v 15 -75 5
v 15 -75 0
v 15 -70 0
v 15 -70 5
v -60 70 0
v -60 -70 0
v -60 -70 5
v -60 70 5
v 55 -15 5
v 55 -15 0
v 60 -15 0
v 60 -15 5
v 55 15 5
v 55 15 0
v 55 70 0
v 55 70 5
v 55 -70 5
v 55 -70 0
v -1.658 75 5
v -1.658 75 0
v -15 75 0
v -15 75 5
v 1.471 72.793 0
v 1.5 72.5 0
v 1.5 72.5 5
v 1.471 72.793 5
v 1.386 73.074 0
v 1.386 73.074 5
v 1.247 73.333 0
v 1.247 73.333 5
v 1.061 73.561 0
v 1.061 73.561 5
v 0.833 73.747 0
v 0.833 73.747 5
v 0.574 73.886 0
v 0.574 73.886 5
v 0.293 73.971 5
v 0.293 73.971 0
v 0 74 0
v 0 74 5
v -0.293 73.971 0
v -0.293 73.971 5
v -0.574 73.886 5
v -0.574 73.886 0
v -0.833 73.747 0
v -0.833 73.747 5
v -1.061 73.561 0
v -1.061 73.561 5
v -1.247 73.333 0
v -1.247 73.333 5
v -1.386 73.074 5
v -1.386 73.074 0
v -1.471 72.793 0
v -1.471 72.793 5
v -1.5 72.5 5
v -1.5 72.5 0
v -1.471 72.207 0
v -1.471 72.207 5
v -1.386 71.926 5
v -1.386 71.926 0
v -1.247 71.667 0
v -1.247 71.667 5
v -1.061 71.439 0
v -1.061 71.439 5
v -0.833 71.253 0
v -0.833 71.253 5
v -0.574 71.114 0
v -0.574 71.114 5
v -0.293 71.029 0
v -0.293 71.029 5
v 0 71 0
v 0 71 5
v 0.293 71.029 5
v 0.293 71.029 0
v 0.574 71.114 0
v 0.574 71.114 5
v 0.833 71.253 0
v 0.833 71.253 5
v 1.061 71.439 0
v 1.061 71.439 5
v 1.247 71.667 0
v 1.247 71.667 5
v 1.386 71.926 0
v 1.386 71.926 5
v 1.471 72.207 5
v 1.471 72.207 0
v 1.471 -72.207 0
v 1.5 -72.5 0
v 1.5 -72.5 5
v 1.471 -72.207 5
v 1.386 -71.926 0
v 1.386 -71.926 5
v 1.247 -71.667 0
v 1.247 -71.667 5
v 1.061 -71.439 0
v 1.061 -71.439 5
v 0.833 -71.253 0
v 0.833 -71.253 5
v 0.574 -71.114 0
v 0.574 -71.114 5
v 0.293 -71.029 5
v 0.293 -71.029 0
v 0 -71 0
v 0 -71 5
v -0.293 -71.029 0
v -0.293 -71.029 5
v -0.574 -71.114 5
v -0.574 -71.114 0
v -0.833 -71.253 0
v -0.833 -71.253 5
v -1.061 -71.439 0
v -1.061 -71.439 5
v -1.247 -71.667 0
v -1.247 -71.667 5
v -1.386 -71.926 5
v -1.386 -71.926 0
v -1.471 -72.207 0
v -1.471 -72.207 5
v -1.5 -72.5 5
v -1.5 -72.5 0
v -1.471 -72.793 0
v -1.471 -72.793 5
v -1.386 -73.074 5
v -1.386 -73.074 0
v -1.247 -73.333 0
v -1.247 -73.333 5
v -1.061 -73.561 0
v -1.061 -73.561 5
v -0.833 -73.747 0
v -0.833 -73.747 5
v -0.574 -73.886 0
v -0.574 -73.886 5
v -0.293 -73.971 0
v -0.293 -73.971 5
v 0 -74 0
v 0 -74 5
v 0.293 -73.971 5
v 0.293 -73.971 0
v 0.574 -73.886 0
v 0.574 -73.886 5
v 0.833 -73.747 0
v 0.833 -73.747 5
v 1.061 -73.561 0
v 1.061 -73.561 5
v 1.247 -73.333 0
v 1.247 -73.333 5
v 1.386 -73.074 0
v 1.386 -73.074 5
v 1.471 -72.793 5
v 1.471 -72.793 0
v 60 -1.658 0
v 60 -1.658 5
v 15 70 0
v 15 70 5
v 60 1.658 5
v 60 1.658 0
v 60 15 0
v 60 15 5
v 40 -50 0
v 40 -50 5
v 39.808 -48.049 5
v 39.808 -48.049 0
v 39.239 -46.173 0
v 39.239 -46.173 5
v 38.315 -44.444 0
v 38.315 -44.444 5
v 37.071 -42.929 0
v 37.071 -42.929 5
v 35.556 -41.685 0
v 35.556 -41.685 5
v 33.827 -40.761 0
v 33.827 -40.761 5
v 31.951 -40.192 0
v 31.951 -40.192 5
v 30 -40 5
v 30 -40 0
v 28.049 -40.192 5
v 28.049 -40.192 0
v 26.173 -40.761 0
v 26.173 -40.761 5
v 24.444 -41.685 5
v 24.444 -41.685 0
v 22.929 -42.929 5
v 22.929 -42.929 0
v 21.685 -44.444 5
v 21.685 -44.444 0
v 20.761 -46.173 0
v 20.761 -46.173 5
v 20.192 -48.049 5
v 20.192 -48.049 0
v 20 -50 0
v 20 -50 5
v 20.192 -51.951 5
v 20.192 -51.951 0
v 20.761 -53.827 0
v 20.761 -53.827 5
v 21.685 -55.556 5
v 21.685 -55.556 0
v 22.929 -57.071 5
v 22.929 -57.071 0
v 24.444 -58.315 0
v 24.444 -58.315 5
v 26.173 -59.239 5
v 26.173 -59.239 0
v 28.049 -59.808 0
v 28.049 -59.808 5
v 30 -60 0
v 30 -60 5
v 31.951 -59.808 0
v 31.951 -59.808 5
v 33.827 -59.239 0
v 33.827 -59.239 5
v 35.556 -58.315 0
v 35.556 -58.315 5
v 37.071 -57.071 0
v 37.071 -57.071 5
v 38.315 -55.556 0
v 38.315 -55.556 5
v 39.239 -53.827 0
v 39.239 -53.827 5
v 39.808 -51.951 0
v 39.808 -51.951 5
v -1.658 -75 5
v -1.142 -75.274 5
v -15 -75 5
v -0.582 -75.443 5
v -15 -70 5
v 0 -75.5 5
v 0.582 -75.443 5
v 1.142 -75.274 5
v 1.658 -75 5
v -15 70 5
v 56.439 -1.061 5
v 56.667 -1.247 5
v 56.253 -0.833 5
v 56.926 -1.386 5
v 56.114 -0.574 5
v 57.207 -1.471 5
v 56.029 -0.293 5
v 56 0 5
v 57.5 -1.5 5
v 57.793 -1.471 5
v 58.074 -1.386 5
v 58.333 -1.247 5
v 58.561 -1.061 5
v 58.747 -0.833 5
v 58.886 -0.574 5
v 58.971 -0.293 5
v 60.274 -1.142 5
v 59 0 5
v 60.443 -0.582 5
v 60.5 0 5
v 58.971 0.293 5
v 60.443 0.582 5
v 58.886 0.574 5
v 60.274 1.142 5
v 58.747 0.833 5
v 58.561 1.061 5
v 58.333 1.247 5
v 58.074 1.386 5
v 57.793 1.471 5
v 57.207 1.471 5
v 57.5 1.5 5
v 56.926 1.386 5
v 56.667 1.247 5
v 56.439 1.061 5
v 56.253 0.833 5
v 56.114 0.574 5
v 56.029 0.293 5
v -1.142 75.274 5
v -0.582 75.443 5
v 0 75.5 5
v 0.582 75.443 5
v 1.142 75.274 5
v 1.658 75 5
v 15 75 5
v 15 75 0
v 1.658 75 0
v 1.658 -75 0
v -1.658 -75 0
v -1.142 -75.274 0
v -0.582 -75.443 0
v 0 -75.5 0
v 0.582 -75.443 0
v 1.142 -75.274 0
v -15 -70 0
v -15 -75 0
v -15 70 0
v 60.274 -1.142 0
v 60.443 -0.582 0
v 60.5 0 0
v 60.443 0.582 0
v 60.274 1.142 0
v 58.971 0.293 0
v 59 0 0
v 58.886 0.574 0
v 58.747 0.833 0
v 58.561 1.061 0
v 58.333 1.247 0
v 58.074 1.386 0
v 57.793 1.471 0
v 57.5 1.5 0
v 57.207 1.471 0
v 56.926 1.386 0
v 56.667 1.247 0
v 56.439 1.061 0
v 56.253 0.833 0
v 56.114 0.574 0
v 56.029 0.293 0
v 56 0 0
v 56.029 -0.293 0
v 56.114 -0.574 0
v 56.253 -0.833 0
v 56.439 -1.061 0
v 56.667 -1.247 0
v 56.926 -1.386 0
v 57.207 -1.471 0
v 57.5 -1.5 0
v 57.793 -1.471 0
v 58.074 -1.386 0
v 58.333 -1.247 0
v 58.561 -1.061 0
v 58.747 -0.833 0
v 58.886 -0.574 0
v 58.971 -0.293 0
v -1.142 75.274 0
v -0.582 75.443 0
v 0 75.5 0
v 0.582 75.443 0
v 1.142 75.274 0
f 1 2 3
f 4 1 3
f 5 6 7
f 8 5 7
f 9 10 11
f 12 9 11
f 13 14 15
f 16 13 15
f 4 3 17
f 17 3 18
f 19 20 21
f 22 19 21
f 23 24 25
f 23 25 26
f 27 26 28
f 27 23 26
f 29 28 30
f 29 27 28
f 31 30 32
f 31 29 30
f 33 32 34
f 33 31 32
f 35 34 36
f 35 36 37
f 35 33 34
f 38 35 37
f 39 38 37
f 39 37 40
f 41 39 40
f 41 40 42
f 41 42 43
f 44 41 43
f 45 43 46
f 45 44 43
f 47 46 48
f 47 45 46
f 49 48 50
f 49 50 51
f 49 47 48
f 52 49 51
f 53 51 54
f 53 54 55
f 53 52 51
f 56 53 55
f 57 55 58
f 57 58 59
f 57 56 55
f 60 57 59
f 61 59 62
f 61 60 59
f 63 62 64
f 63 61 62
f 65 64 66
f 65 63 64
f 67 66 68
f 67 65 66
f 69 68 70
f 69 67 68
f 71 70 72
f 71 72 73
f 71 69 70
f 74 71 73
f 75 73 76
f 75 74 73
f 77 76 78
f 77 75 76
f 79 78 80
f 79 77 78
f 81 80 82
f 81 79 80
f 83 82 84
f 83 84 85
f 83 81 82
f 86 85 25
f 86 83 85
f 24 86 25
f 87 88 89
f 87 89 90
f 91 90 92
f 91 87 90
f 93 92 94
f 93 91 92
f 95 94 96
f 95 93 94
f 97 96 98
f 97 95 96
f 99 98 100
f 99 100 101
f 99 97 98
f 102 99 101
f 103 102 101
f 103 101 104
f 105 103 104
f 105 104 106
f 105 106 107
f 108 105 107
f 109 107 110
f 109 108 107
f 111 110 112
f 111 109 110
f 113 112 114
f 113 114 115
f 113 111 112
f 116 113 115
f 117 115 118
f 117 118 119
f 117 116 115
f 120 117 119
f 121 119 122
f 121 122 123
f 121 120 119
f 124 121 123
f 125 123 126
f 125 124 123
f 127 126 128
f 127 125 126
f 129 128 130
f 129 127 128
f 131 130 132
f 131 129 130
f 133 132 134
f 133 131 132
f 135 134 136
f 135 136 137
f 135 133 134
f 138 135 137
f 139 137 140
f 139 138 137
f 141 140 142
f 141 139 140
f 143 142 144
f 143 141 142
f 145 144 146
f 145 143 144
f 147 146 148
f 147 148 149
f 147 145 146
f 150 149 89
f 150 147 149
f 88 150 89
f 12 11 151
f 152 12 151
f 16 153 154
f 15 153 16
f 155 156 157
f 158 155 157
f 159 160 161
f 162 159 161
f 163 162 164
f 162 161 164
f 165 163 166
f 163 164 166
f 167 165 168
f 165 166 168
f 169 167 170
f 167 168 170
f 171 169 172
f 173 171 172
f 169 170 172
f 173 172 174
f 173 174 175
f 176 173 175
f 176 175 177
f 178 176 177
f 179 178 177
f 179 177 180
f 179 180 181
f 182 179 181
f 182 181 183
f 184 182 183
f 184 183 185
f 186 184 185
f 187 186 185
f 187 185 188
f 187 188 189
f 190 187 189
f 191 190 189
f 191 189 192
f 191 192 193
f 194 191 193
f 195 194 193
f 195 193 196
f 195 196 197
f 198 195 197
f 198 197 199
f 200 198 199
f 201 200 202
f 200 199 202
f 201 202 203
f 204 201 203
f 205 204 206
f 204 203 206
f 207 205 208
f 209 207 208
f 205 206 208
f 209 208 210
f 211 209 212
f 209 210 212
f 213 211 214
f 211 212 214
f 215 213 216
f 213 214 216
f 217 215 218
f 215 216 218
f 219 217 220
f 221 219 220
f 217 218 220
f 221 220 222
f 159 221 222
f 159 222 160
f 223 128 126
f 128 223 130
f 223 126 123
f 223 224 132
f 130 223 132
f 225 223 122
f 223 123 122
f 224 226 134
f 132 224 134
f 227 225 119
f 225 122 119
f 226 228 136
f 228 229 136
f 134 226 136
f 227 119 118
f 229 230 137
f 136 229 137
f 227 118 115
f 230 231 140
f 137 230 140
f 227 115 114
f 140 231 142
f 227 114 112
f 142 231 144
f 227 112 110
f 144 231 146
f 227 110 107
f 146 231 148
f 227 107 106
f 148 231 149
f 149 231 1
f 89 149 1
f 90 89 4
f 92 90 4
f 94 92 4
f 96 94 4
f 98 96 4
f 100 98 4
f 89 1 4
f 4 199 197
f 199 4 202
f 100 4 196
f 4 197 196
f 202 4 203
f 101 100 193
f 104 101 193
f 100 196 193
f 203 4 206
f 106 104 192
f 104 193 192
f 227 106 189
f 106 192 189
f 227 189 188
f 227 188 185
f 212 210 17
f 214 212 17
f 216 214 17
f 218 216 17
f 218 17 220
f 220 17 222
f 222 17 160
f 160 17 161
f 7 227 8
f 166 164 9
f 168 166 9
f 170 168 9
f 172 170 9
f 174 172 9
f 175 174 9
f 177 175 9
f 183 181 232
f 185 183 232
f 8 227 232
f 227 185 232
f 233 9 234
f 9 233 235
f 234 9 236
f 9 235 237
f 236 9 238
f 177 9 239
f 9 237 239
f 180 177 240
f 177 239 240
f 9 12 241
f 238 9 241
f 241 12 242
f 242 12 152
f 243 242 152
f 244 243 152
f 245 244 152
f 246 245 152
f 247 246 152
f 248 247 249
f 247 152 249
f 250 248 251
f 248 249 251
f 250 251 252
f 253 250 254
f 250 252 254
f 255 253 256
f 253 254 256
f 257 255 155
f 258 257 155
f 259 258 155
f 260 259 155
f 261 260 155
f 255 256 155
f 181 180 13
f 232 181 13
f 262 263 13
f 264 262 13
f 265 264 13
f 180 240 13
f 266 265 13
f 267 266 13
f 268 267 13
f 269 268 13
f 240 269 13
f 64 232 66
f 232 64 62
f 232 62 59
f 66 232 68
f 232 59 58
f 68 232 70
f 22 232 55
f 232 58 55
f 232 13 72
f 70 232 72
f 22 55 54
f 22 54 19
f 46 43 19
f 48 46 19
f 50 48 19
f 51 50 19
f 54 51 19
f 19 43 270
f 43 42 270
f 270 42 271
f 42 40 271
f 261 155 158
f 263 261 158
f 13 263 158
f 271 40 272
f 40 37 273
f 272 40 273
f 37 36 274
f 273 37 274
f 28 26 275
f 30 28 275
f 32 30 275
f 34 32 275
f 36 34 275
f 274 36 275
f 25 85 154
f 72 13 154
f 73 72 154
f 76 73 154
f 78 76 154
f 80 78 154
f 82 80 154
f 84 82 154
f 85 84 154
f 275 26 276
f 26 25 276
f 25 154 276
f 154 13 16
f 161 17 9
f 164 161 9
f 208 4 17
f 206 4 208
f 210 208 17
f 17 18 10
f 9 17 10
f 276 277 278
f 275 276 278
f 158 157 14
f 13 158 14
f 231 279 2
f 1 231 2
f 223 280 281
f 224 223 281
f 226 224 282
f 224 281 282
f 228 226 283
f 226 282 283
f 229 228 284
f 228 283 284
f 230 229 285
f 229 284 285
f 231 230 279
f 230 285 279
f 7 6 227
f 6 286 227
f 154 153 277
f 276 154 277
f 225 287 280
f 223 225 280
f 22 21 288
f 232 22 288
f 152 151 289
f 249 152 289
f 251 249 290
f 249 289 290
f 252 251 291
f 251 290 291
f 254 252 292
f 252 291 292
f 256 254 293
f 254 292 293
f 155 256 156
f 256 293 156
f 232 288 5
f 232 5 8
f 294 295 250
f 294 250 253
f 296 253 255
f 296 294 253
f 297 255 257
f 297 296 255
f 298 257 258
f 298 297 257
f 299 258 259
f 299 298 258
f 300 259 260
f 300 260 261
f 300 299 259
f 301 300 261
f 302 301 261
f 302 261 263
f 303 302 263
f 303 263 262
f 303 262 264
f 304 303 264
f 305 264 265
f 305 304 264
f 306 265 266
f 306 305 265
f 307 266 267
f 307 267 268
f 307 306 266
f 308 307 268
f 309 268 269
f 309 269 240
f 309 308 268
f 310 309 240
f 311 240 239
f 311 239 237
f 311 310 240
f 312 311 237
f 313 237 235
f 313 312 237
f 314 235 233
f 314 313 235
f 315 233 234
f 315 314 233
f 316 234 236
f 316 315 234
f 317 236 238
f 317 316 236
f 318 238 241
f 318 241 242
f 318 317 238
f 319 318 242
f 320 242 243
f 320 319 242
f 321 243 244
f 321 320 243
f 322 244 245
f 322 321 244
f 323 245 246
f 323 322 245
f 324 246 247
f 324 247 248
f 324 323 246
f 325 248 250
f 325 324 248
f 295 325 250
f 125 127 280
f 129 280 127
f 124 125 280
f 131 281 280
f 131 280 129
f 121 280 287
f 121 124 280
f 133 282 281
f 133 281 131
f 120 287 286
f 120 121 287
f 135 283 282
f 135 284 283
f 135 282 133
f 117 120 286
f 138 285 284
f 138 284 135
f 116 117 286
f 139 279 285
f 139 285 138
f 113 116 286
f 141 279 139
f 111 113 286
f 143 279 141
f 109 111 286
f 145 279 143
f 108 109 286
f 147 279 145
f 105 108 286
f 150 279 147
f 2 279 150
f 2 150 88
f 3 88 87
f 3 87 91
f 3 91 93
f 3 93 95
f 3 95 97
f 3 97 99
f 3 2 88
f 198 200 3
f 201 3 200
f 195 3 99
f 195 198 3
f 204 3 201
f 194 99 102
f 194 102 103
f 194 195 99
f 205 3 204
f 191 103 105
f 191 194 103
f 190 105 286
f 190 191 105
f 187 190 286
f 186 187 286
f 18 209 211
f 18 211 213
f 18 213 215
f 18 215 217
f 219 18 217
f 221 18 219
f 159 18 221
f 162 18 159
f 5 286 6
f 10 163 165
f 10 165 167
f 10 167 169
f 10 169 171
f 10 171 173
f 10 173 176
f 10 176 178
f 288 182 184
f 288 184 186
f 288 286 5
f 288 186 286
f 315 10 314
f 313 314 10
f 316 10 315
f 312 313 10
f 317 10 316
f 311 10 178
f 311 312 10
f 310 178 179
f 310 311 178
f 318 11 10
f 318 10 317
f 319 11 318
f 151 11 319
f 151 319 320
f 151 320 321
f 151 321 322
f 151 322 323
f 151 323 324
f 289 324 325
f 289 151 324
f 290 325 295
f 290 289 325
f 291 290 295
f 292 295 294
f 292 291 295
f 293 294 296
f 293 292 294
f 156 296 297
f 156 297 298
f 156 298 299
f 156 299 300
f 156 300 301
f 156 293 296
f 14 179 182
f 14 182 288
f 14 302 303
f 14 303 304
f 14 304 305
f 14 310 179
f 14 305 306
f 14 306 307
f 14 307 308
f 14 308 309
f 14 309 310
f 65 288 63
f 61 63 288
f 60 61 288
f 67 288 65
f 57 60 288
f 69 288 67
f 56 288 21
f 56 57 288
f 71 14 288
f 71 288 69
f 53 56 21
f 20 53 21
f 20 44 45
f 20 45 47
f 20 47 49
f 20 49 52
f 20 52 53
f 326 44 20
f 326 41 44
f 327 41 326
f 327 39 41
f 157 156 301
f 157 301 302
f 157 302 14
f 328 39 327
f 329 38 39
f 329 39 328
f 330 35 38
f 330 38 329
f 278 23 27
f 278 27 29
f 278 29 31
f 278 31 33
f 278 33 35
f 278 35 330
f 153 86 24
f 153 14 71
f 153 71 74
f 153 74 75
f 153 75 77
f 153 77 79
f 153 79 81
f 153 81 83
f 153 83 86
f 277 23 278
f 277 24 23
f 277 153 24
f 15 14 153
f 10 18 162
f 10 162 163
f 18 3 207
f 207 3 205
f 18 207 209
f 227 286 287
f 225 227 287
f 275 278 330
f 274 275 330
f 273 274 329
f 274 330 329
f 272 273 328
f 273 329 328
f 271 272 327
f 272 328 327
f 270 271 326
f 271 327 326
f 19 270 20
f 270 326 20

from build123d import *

# Parameters (mm, degrees)
ESQUISSE1_W             = 110
ESQUISSE1_H             = 140
ESQUISSE1_R             = 1.5
BOSS_EXTRU_1_DEPTH      = 5
ESQUISSE2_W             = 5
ESQUISSE2_H             = 140
BOSS_EXTRU_2_DEPTH      = 5
ESQUISSE3_R             = 10
ENL_V_MAT_EXTRU_1_DEPTH = 10


with BuildPart() as part:
    # Esquisse1 → Boss.-Extru.1 (new body)
    # profile 1 of 5: a face of its own
    with BuildSketch(Plane.XY):
        Rectangle(ESQUISSE1_W, ESQUISSE1_H)
    # profile 2 of 5: a face of its own
    with BuildSketch(Plane.XY):
        Polygon((-15, 70), (-55, 70), (-55, 15), (-55, -15), (-55, -70), (-15, -70), (15, -70), (55, -70), (55, -15), (55, 15), (55, 70), (15, 70), align=None)
    # profile 3 of 5: a face of its own
    with BuildSketch(Plane.XY):
        with BuildLine():
            Line((15, -70), (-15, -70))
            Line((-15, -70), (-15, -75))
            Line((-15, -75), (-1.658312395, -75))
            ThreePointArc((-1.658312395, -75), (0, -75.5), (1.658312395, -75))
            Line((1.658312395, -75), (15, -75))
            Line((15, -75), (15, -70))
        make_face()
        with Locations((0, -72.5)):
            Circle(ESQUISSE1_R, mode=Mode.SUBTRACT)
    # profile 4 of 5: a face of its own
    with BuildSketch(Plane.XY):
        with BuildLine():
            Line((60, 15), (55, 15))
            Line((55, 15), (55, -15))
            Line((55, -15), (60, -15))
            Line((60, -15), (60, -1.658312395))
            ThreePointArc((60, -1.658312395), (60.5, 0), (60, 1.658312395))
            Line((60, 1.658312395), (60, 15))
        make_face()
        with Locations((57.5, 0)):
            Circle(ESQUISSE1_R, mode=Mode.SUBTRACT)
    # profile 5 of 5: a face of its own
    with BuildSketch(Plane.XY):
        with BuildLine():
            Line((-15, 75), (-15, 70))
            Line((-15, 70), (15, 70))
            Line((15, 70), (15, 75))
            Line((15, 75), (1.658312395, 75))
            ThreePointArc((1.658312395, 75), (0, 75.5), (-1.658312395, 75))
            Line((-1.658312395, 75), (-15, 75))
        make_face()
        with Locations((0, 72.5)):
            Circle(ESQUISSE1_R, mode=Mode.SUBTRACT)
    extrude(amount=BOSS_EXTRU_1_DEPTH)

    # Esquisse2 → Boss.-Extru.2 (add)
    with BuildSketch(Plane.ZY.offset(55)):
        with Locations((2.5, 0)):
            Rectangle(ESQUISSE2_W, ESQUISSE2_H)
    extrude(amount=BOSS_EXTRU_2_DEPTH)

    # Esquisse3 → Enlèv. mat.-Extru.1 (cut)
    with BuildSketch(Plane.XY.offset(5)):
        with Locations((30, -50)):
            Circle(ESQUISSE3_R)
    extrude(amount=-ENL_V_MAT_EXTRU_1_DEPTH, mode=Mode.SUBTRACT)


solid = part.part
